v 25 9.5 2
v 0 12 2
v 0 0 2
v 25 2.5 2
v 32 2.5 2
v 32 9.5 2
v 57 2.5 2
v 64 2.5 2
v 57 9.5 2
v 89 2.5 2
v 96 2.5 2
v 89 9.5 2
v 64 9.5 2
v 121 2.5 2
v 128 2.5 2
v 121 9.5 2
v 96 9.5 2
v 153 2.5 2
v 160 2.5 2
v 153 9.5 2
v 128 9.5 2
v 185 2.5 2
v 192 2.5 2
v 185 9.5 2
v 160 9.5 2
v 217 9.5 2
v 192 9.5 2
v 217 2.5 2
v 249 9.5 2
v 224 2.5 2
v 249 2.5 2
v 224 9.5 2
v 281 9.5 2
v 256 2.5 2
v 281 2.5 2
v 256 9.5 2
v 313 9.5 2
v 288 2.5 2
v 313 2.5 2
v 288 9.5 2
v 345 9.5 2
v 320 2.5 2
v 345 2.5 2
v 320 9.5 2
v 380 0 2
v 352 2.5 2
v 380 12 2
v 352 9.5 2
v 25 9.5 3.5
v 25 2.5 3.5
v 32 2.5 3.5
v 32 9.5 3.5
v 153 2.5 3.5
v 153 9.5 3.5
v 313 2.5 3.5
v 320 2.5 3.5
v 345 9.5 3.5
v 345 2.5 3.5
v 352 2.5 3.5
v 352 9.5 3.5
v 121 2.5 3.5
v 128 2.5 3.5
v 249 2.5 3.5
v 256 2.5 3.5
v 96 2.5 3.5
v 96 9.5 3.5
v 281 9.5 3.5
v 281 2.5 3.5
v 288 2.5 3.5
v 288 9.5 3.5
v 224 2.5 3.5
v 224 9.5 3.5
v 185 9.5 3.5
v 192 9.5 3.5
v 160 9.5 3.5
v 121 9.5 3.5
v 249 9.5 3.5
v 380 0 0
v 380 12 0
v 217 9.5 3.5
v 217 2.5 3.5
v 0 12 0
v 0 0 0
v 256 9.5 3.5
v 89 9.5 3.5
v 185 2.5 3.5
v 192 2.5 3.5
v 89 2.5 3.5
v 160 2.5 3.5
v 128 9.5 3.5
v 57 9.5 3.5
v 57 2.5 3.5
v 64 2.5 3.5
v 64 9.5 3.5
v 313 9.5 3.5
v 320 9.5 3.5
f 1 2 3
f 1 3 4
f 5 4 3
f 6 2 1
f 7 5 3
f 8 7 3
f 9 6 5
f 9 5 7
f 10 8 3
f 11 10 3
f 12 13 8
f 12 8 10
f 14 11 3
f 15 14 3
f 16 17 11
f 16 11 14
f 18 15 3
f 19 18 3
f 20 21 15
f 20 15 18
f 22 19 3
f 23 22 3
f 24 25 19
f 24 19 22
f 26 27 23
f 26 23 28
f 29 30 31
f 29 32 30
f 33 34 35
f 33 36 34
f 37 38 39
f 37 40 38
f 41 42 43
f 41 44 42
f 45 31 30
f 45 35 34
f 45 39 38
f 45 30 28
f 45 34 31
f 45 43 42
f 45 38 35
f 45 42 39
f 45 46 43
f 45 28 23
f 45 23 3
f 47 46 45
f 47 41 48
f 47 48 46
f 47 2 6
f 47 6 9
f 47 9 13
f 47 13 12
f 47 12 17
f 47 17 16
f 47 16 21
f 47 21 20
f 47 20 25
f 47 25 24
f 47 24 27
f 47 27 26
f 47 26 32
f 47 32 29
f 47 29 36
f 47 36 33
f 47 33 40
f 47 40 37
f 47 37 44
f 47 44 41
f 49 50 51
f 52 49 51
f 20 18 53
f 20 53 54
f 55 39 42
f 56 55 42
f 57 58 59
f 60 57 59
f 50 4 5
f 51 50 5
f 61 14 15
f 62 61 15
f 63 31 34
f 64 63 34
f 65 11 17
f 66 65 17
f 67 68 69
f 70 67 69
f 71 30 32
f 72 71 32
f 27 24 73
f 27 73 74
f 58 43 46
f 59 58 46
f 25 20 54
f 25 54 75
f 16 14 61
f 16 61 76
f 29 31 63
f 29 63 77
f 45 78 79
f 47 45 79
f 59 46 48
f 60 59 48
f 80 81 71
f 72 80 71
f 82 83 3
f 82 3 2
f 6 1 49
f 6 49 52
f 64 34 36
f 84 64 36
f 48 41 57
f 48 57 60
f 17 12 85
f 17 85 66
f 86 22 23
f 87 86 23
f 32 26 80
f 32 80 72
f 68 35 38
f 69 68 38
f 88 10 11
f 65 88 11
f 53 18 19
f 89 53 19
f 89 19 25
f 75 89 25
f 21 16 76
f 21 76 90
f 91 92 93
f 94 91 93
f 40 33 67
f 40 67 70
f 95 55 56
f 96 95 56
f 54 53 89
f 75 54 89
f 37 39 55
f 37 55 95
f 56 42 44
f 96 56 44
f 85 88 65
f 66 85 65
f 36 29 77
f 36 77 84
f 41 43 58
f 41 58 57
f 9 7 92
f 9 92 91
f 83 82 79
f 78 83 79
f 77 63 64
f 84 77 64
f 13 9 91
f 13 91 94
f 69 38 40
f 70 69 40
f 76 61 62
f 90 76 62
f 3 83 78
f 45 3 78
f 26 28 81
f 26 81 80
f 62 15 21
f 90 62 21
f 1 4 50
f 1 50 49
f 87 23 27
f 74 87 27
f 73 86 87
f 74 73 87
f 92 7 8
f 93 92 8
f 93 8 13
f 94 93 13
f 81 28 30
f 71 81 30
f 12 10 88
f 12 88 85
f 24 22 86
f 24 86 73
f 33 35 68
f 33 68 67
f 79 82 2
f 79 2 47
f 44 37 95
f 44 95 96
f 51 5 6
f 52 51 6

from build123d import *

# Parameters (mm, degrees)
SKETCH1_W           = 380
SKETCH1_H           = 12
BOSS_EXTRUDE1_DEPTH = 2
SKETCH2_W           = 7
SKETCH2_H           = 7
BOSS_EXTRUDE2_DEPTH = 1.5


with BuildPart() as part:
    # Sketch1 → Boss-Extrude1 (new body)
    with BuildSketch(Plane.XY):
        with Locations((190, 6)):
            Rectangle(SKETCH1_W, SKETCH1_H)
    extrude(amount=BOSS_EXTRUDE1_DEPTH)

    # Sketch2 → Boss-Extrude2 (add)
    with BuildSketch(Plane.XY.offset(2)):
        with Locations((28.5, 6)):
            Rectangle(SKETCH2_W, SKETCH2_H)
        with Locations((60.5, 6)):
            Rectangle(SKETCH2_W, SKETCH2_H)
        with Locations((92.5, 6)):
            Rectangle(SKETCH2_W, SKETCH2_H)
        with Locations((124.5, 6)):
            Rectangle(SKETCH2_W, SKETCH2_H)
        with Locations((156.5, 6)):
            Rectangle(SKETCH2_W, SKETCH2_H)
        with Locations((188.5, 6)):
            Rectangle(SKETCH2_W, SKETCH2_H)
        with Locations((220.5, 6)):
            Rectangle(SKETCH2_W, SKETCH2_H)
        with Locations((252.5, 6)):
            Rectangle(SKETCH2_W, SKETCH2_H)
        with Locations((284.5, 6)):
            Rectangle(SKETCH2_W, SKETCH2_H)
        with Locations((316.5, 6)):
            Rectangle(SKETCH2_W, SKETCH2_H)
        with Locations((348.5, 6)):
            Rectangle(SKETCH2_W, SKETCH2_H)
    extrude(amount=BOSS_EXTRUDE2_DEPTH)


solid = part.part
